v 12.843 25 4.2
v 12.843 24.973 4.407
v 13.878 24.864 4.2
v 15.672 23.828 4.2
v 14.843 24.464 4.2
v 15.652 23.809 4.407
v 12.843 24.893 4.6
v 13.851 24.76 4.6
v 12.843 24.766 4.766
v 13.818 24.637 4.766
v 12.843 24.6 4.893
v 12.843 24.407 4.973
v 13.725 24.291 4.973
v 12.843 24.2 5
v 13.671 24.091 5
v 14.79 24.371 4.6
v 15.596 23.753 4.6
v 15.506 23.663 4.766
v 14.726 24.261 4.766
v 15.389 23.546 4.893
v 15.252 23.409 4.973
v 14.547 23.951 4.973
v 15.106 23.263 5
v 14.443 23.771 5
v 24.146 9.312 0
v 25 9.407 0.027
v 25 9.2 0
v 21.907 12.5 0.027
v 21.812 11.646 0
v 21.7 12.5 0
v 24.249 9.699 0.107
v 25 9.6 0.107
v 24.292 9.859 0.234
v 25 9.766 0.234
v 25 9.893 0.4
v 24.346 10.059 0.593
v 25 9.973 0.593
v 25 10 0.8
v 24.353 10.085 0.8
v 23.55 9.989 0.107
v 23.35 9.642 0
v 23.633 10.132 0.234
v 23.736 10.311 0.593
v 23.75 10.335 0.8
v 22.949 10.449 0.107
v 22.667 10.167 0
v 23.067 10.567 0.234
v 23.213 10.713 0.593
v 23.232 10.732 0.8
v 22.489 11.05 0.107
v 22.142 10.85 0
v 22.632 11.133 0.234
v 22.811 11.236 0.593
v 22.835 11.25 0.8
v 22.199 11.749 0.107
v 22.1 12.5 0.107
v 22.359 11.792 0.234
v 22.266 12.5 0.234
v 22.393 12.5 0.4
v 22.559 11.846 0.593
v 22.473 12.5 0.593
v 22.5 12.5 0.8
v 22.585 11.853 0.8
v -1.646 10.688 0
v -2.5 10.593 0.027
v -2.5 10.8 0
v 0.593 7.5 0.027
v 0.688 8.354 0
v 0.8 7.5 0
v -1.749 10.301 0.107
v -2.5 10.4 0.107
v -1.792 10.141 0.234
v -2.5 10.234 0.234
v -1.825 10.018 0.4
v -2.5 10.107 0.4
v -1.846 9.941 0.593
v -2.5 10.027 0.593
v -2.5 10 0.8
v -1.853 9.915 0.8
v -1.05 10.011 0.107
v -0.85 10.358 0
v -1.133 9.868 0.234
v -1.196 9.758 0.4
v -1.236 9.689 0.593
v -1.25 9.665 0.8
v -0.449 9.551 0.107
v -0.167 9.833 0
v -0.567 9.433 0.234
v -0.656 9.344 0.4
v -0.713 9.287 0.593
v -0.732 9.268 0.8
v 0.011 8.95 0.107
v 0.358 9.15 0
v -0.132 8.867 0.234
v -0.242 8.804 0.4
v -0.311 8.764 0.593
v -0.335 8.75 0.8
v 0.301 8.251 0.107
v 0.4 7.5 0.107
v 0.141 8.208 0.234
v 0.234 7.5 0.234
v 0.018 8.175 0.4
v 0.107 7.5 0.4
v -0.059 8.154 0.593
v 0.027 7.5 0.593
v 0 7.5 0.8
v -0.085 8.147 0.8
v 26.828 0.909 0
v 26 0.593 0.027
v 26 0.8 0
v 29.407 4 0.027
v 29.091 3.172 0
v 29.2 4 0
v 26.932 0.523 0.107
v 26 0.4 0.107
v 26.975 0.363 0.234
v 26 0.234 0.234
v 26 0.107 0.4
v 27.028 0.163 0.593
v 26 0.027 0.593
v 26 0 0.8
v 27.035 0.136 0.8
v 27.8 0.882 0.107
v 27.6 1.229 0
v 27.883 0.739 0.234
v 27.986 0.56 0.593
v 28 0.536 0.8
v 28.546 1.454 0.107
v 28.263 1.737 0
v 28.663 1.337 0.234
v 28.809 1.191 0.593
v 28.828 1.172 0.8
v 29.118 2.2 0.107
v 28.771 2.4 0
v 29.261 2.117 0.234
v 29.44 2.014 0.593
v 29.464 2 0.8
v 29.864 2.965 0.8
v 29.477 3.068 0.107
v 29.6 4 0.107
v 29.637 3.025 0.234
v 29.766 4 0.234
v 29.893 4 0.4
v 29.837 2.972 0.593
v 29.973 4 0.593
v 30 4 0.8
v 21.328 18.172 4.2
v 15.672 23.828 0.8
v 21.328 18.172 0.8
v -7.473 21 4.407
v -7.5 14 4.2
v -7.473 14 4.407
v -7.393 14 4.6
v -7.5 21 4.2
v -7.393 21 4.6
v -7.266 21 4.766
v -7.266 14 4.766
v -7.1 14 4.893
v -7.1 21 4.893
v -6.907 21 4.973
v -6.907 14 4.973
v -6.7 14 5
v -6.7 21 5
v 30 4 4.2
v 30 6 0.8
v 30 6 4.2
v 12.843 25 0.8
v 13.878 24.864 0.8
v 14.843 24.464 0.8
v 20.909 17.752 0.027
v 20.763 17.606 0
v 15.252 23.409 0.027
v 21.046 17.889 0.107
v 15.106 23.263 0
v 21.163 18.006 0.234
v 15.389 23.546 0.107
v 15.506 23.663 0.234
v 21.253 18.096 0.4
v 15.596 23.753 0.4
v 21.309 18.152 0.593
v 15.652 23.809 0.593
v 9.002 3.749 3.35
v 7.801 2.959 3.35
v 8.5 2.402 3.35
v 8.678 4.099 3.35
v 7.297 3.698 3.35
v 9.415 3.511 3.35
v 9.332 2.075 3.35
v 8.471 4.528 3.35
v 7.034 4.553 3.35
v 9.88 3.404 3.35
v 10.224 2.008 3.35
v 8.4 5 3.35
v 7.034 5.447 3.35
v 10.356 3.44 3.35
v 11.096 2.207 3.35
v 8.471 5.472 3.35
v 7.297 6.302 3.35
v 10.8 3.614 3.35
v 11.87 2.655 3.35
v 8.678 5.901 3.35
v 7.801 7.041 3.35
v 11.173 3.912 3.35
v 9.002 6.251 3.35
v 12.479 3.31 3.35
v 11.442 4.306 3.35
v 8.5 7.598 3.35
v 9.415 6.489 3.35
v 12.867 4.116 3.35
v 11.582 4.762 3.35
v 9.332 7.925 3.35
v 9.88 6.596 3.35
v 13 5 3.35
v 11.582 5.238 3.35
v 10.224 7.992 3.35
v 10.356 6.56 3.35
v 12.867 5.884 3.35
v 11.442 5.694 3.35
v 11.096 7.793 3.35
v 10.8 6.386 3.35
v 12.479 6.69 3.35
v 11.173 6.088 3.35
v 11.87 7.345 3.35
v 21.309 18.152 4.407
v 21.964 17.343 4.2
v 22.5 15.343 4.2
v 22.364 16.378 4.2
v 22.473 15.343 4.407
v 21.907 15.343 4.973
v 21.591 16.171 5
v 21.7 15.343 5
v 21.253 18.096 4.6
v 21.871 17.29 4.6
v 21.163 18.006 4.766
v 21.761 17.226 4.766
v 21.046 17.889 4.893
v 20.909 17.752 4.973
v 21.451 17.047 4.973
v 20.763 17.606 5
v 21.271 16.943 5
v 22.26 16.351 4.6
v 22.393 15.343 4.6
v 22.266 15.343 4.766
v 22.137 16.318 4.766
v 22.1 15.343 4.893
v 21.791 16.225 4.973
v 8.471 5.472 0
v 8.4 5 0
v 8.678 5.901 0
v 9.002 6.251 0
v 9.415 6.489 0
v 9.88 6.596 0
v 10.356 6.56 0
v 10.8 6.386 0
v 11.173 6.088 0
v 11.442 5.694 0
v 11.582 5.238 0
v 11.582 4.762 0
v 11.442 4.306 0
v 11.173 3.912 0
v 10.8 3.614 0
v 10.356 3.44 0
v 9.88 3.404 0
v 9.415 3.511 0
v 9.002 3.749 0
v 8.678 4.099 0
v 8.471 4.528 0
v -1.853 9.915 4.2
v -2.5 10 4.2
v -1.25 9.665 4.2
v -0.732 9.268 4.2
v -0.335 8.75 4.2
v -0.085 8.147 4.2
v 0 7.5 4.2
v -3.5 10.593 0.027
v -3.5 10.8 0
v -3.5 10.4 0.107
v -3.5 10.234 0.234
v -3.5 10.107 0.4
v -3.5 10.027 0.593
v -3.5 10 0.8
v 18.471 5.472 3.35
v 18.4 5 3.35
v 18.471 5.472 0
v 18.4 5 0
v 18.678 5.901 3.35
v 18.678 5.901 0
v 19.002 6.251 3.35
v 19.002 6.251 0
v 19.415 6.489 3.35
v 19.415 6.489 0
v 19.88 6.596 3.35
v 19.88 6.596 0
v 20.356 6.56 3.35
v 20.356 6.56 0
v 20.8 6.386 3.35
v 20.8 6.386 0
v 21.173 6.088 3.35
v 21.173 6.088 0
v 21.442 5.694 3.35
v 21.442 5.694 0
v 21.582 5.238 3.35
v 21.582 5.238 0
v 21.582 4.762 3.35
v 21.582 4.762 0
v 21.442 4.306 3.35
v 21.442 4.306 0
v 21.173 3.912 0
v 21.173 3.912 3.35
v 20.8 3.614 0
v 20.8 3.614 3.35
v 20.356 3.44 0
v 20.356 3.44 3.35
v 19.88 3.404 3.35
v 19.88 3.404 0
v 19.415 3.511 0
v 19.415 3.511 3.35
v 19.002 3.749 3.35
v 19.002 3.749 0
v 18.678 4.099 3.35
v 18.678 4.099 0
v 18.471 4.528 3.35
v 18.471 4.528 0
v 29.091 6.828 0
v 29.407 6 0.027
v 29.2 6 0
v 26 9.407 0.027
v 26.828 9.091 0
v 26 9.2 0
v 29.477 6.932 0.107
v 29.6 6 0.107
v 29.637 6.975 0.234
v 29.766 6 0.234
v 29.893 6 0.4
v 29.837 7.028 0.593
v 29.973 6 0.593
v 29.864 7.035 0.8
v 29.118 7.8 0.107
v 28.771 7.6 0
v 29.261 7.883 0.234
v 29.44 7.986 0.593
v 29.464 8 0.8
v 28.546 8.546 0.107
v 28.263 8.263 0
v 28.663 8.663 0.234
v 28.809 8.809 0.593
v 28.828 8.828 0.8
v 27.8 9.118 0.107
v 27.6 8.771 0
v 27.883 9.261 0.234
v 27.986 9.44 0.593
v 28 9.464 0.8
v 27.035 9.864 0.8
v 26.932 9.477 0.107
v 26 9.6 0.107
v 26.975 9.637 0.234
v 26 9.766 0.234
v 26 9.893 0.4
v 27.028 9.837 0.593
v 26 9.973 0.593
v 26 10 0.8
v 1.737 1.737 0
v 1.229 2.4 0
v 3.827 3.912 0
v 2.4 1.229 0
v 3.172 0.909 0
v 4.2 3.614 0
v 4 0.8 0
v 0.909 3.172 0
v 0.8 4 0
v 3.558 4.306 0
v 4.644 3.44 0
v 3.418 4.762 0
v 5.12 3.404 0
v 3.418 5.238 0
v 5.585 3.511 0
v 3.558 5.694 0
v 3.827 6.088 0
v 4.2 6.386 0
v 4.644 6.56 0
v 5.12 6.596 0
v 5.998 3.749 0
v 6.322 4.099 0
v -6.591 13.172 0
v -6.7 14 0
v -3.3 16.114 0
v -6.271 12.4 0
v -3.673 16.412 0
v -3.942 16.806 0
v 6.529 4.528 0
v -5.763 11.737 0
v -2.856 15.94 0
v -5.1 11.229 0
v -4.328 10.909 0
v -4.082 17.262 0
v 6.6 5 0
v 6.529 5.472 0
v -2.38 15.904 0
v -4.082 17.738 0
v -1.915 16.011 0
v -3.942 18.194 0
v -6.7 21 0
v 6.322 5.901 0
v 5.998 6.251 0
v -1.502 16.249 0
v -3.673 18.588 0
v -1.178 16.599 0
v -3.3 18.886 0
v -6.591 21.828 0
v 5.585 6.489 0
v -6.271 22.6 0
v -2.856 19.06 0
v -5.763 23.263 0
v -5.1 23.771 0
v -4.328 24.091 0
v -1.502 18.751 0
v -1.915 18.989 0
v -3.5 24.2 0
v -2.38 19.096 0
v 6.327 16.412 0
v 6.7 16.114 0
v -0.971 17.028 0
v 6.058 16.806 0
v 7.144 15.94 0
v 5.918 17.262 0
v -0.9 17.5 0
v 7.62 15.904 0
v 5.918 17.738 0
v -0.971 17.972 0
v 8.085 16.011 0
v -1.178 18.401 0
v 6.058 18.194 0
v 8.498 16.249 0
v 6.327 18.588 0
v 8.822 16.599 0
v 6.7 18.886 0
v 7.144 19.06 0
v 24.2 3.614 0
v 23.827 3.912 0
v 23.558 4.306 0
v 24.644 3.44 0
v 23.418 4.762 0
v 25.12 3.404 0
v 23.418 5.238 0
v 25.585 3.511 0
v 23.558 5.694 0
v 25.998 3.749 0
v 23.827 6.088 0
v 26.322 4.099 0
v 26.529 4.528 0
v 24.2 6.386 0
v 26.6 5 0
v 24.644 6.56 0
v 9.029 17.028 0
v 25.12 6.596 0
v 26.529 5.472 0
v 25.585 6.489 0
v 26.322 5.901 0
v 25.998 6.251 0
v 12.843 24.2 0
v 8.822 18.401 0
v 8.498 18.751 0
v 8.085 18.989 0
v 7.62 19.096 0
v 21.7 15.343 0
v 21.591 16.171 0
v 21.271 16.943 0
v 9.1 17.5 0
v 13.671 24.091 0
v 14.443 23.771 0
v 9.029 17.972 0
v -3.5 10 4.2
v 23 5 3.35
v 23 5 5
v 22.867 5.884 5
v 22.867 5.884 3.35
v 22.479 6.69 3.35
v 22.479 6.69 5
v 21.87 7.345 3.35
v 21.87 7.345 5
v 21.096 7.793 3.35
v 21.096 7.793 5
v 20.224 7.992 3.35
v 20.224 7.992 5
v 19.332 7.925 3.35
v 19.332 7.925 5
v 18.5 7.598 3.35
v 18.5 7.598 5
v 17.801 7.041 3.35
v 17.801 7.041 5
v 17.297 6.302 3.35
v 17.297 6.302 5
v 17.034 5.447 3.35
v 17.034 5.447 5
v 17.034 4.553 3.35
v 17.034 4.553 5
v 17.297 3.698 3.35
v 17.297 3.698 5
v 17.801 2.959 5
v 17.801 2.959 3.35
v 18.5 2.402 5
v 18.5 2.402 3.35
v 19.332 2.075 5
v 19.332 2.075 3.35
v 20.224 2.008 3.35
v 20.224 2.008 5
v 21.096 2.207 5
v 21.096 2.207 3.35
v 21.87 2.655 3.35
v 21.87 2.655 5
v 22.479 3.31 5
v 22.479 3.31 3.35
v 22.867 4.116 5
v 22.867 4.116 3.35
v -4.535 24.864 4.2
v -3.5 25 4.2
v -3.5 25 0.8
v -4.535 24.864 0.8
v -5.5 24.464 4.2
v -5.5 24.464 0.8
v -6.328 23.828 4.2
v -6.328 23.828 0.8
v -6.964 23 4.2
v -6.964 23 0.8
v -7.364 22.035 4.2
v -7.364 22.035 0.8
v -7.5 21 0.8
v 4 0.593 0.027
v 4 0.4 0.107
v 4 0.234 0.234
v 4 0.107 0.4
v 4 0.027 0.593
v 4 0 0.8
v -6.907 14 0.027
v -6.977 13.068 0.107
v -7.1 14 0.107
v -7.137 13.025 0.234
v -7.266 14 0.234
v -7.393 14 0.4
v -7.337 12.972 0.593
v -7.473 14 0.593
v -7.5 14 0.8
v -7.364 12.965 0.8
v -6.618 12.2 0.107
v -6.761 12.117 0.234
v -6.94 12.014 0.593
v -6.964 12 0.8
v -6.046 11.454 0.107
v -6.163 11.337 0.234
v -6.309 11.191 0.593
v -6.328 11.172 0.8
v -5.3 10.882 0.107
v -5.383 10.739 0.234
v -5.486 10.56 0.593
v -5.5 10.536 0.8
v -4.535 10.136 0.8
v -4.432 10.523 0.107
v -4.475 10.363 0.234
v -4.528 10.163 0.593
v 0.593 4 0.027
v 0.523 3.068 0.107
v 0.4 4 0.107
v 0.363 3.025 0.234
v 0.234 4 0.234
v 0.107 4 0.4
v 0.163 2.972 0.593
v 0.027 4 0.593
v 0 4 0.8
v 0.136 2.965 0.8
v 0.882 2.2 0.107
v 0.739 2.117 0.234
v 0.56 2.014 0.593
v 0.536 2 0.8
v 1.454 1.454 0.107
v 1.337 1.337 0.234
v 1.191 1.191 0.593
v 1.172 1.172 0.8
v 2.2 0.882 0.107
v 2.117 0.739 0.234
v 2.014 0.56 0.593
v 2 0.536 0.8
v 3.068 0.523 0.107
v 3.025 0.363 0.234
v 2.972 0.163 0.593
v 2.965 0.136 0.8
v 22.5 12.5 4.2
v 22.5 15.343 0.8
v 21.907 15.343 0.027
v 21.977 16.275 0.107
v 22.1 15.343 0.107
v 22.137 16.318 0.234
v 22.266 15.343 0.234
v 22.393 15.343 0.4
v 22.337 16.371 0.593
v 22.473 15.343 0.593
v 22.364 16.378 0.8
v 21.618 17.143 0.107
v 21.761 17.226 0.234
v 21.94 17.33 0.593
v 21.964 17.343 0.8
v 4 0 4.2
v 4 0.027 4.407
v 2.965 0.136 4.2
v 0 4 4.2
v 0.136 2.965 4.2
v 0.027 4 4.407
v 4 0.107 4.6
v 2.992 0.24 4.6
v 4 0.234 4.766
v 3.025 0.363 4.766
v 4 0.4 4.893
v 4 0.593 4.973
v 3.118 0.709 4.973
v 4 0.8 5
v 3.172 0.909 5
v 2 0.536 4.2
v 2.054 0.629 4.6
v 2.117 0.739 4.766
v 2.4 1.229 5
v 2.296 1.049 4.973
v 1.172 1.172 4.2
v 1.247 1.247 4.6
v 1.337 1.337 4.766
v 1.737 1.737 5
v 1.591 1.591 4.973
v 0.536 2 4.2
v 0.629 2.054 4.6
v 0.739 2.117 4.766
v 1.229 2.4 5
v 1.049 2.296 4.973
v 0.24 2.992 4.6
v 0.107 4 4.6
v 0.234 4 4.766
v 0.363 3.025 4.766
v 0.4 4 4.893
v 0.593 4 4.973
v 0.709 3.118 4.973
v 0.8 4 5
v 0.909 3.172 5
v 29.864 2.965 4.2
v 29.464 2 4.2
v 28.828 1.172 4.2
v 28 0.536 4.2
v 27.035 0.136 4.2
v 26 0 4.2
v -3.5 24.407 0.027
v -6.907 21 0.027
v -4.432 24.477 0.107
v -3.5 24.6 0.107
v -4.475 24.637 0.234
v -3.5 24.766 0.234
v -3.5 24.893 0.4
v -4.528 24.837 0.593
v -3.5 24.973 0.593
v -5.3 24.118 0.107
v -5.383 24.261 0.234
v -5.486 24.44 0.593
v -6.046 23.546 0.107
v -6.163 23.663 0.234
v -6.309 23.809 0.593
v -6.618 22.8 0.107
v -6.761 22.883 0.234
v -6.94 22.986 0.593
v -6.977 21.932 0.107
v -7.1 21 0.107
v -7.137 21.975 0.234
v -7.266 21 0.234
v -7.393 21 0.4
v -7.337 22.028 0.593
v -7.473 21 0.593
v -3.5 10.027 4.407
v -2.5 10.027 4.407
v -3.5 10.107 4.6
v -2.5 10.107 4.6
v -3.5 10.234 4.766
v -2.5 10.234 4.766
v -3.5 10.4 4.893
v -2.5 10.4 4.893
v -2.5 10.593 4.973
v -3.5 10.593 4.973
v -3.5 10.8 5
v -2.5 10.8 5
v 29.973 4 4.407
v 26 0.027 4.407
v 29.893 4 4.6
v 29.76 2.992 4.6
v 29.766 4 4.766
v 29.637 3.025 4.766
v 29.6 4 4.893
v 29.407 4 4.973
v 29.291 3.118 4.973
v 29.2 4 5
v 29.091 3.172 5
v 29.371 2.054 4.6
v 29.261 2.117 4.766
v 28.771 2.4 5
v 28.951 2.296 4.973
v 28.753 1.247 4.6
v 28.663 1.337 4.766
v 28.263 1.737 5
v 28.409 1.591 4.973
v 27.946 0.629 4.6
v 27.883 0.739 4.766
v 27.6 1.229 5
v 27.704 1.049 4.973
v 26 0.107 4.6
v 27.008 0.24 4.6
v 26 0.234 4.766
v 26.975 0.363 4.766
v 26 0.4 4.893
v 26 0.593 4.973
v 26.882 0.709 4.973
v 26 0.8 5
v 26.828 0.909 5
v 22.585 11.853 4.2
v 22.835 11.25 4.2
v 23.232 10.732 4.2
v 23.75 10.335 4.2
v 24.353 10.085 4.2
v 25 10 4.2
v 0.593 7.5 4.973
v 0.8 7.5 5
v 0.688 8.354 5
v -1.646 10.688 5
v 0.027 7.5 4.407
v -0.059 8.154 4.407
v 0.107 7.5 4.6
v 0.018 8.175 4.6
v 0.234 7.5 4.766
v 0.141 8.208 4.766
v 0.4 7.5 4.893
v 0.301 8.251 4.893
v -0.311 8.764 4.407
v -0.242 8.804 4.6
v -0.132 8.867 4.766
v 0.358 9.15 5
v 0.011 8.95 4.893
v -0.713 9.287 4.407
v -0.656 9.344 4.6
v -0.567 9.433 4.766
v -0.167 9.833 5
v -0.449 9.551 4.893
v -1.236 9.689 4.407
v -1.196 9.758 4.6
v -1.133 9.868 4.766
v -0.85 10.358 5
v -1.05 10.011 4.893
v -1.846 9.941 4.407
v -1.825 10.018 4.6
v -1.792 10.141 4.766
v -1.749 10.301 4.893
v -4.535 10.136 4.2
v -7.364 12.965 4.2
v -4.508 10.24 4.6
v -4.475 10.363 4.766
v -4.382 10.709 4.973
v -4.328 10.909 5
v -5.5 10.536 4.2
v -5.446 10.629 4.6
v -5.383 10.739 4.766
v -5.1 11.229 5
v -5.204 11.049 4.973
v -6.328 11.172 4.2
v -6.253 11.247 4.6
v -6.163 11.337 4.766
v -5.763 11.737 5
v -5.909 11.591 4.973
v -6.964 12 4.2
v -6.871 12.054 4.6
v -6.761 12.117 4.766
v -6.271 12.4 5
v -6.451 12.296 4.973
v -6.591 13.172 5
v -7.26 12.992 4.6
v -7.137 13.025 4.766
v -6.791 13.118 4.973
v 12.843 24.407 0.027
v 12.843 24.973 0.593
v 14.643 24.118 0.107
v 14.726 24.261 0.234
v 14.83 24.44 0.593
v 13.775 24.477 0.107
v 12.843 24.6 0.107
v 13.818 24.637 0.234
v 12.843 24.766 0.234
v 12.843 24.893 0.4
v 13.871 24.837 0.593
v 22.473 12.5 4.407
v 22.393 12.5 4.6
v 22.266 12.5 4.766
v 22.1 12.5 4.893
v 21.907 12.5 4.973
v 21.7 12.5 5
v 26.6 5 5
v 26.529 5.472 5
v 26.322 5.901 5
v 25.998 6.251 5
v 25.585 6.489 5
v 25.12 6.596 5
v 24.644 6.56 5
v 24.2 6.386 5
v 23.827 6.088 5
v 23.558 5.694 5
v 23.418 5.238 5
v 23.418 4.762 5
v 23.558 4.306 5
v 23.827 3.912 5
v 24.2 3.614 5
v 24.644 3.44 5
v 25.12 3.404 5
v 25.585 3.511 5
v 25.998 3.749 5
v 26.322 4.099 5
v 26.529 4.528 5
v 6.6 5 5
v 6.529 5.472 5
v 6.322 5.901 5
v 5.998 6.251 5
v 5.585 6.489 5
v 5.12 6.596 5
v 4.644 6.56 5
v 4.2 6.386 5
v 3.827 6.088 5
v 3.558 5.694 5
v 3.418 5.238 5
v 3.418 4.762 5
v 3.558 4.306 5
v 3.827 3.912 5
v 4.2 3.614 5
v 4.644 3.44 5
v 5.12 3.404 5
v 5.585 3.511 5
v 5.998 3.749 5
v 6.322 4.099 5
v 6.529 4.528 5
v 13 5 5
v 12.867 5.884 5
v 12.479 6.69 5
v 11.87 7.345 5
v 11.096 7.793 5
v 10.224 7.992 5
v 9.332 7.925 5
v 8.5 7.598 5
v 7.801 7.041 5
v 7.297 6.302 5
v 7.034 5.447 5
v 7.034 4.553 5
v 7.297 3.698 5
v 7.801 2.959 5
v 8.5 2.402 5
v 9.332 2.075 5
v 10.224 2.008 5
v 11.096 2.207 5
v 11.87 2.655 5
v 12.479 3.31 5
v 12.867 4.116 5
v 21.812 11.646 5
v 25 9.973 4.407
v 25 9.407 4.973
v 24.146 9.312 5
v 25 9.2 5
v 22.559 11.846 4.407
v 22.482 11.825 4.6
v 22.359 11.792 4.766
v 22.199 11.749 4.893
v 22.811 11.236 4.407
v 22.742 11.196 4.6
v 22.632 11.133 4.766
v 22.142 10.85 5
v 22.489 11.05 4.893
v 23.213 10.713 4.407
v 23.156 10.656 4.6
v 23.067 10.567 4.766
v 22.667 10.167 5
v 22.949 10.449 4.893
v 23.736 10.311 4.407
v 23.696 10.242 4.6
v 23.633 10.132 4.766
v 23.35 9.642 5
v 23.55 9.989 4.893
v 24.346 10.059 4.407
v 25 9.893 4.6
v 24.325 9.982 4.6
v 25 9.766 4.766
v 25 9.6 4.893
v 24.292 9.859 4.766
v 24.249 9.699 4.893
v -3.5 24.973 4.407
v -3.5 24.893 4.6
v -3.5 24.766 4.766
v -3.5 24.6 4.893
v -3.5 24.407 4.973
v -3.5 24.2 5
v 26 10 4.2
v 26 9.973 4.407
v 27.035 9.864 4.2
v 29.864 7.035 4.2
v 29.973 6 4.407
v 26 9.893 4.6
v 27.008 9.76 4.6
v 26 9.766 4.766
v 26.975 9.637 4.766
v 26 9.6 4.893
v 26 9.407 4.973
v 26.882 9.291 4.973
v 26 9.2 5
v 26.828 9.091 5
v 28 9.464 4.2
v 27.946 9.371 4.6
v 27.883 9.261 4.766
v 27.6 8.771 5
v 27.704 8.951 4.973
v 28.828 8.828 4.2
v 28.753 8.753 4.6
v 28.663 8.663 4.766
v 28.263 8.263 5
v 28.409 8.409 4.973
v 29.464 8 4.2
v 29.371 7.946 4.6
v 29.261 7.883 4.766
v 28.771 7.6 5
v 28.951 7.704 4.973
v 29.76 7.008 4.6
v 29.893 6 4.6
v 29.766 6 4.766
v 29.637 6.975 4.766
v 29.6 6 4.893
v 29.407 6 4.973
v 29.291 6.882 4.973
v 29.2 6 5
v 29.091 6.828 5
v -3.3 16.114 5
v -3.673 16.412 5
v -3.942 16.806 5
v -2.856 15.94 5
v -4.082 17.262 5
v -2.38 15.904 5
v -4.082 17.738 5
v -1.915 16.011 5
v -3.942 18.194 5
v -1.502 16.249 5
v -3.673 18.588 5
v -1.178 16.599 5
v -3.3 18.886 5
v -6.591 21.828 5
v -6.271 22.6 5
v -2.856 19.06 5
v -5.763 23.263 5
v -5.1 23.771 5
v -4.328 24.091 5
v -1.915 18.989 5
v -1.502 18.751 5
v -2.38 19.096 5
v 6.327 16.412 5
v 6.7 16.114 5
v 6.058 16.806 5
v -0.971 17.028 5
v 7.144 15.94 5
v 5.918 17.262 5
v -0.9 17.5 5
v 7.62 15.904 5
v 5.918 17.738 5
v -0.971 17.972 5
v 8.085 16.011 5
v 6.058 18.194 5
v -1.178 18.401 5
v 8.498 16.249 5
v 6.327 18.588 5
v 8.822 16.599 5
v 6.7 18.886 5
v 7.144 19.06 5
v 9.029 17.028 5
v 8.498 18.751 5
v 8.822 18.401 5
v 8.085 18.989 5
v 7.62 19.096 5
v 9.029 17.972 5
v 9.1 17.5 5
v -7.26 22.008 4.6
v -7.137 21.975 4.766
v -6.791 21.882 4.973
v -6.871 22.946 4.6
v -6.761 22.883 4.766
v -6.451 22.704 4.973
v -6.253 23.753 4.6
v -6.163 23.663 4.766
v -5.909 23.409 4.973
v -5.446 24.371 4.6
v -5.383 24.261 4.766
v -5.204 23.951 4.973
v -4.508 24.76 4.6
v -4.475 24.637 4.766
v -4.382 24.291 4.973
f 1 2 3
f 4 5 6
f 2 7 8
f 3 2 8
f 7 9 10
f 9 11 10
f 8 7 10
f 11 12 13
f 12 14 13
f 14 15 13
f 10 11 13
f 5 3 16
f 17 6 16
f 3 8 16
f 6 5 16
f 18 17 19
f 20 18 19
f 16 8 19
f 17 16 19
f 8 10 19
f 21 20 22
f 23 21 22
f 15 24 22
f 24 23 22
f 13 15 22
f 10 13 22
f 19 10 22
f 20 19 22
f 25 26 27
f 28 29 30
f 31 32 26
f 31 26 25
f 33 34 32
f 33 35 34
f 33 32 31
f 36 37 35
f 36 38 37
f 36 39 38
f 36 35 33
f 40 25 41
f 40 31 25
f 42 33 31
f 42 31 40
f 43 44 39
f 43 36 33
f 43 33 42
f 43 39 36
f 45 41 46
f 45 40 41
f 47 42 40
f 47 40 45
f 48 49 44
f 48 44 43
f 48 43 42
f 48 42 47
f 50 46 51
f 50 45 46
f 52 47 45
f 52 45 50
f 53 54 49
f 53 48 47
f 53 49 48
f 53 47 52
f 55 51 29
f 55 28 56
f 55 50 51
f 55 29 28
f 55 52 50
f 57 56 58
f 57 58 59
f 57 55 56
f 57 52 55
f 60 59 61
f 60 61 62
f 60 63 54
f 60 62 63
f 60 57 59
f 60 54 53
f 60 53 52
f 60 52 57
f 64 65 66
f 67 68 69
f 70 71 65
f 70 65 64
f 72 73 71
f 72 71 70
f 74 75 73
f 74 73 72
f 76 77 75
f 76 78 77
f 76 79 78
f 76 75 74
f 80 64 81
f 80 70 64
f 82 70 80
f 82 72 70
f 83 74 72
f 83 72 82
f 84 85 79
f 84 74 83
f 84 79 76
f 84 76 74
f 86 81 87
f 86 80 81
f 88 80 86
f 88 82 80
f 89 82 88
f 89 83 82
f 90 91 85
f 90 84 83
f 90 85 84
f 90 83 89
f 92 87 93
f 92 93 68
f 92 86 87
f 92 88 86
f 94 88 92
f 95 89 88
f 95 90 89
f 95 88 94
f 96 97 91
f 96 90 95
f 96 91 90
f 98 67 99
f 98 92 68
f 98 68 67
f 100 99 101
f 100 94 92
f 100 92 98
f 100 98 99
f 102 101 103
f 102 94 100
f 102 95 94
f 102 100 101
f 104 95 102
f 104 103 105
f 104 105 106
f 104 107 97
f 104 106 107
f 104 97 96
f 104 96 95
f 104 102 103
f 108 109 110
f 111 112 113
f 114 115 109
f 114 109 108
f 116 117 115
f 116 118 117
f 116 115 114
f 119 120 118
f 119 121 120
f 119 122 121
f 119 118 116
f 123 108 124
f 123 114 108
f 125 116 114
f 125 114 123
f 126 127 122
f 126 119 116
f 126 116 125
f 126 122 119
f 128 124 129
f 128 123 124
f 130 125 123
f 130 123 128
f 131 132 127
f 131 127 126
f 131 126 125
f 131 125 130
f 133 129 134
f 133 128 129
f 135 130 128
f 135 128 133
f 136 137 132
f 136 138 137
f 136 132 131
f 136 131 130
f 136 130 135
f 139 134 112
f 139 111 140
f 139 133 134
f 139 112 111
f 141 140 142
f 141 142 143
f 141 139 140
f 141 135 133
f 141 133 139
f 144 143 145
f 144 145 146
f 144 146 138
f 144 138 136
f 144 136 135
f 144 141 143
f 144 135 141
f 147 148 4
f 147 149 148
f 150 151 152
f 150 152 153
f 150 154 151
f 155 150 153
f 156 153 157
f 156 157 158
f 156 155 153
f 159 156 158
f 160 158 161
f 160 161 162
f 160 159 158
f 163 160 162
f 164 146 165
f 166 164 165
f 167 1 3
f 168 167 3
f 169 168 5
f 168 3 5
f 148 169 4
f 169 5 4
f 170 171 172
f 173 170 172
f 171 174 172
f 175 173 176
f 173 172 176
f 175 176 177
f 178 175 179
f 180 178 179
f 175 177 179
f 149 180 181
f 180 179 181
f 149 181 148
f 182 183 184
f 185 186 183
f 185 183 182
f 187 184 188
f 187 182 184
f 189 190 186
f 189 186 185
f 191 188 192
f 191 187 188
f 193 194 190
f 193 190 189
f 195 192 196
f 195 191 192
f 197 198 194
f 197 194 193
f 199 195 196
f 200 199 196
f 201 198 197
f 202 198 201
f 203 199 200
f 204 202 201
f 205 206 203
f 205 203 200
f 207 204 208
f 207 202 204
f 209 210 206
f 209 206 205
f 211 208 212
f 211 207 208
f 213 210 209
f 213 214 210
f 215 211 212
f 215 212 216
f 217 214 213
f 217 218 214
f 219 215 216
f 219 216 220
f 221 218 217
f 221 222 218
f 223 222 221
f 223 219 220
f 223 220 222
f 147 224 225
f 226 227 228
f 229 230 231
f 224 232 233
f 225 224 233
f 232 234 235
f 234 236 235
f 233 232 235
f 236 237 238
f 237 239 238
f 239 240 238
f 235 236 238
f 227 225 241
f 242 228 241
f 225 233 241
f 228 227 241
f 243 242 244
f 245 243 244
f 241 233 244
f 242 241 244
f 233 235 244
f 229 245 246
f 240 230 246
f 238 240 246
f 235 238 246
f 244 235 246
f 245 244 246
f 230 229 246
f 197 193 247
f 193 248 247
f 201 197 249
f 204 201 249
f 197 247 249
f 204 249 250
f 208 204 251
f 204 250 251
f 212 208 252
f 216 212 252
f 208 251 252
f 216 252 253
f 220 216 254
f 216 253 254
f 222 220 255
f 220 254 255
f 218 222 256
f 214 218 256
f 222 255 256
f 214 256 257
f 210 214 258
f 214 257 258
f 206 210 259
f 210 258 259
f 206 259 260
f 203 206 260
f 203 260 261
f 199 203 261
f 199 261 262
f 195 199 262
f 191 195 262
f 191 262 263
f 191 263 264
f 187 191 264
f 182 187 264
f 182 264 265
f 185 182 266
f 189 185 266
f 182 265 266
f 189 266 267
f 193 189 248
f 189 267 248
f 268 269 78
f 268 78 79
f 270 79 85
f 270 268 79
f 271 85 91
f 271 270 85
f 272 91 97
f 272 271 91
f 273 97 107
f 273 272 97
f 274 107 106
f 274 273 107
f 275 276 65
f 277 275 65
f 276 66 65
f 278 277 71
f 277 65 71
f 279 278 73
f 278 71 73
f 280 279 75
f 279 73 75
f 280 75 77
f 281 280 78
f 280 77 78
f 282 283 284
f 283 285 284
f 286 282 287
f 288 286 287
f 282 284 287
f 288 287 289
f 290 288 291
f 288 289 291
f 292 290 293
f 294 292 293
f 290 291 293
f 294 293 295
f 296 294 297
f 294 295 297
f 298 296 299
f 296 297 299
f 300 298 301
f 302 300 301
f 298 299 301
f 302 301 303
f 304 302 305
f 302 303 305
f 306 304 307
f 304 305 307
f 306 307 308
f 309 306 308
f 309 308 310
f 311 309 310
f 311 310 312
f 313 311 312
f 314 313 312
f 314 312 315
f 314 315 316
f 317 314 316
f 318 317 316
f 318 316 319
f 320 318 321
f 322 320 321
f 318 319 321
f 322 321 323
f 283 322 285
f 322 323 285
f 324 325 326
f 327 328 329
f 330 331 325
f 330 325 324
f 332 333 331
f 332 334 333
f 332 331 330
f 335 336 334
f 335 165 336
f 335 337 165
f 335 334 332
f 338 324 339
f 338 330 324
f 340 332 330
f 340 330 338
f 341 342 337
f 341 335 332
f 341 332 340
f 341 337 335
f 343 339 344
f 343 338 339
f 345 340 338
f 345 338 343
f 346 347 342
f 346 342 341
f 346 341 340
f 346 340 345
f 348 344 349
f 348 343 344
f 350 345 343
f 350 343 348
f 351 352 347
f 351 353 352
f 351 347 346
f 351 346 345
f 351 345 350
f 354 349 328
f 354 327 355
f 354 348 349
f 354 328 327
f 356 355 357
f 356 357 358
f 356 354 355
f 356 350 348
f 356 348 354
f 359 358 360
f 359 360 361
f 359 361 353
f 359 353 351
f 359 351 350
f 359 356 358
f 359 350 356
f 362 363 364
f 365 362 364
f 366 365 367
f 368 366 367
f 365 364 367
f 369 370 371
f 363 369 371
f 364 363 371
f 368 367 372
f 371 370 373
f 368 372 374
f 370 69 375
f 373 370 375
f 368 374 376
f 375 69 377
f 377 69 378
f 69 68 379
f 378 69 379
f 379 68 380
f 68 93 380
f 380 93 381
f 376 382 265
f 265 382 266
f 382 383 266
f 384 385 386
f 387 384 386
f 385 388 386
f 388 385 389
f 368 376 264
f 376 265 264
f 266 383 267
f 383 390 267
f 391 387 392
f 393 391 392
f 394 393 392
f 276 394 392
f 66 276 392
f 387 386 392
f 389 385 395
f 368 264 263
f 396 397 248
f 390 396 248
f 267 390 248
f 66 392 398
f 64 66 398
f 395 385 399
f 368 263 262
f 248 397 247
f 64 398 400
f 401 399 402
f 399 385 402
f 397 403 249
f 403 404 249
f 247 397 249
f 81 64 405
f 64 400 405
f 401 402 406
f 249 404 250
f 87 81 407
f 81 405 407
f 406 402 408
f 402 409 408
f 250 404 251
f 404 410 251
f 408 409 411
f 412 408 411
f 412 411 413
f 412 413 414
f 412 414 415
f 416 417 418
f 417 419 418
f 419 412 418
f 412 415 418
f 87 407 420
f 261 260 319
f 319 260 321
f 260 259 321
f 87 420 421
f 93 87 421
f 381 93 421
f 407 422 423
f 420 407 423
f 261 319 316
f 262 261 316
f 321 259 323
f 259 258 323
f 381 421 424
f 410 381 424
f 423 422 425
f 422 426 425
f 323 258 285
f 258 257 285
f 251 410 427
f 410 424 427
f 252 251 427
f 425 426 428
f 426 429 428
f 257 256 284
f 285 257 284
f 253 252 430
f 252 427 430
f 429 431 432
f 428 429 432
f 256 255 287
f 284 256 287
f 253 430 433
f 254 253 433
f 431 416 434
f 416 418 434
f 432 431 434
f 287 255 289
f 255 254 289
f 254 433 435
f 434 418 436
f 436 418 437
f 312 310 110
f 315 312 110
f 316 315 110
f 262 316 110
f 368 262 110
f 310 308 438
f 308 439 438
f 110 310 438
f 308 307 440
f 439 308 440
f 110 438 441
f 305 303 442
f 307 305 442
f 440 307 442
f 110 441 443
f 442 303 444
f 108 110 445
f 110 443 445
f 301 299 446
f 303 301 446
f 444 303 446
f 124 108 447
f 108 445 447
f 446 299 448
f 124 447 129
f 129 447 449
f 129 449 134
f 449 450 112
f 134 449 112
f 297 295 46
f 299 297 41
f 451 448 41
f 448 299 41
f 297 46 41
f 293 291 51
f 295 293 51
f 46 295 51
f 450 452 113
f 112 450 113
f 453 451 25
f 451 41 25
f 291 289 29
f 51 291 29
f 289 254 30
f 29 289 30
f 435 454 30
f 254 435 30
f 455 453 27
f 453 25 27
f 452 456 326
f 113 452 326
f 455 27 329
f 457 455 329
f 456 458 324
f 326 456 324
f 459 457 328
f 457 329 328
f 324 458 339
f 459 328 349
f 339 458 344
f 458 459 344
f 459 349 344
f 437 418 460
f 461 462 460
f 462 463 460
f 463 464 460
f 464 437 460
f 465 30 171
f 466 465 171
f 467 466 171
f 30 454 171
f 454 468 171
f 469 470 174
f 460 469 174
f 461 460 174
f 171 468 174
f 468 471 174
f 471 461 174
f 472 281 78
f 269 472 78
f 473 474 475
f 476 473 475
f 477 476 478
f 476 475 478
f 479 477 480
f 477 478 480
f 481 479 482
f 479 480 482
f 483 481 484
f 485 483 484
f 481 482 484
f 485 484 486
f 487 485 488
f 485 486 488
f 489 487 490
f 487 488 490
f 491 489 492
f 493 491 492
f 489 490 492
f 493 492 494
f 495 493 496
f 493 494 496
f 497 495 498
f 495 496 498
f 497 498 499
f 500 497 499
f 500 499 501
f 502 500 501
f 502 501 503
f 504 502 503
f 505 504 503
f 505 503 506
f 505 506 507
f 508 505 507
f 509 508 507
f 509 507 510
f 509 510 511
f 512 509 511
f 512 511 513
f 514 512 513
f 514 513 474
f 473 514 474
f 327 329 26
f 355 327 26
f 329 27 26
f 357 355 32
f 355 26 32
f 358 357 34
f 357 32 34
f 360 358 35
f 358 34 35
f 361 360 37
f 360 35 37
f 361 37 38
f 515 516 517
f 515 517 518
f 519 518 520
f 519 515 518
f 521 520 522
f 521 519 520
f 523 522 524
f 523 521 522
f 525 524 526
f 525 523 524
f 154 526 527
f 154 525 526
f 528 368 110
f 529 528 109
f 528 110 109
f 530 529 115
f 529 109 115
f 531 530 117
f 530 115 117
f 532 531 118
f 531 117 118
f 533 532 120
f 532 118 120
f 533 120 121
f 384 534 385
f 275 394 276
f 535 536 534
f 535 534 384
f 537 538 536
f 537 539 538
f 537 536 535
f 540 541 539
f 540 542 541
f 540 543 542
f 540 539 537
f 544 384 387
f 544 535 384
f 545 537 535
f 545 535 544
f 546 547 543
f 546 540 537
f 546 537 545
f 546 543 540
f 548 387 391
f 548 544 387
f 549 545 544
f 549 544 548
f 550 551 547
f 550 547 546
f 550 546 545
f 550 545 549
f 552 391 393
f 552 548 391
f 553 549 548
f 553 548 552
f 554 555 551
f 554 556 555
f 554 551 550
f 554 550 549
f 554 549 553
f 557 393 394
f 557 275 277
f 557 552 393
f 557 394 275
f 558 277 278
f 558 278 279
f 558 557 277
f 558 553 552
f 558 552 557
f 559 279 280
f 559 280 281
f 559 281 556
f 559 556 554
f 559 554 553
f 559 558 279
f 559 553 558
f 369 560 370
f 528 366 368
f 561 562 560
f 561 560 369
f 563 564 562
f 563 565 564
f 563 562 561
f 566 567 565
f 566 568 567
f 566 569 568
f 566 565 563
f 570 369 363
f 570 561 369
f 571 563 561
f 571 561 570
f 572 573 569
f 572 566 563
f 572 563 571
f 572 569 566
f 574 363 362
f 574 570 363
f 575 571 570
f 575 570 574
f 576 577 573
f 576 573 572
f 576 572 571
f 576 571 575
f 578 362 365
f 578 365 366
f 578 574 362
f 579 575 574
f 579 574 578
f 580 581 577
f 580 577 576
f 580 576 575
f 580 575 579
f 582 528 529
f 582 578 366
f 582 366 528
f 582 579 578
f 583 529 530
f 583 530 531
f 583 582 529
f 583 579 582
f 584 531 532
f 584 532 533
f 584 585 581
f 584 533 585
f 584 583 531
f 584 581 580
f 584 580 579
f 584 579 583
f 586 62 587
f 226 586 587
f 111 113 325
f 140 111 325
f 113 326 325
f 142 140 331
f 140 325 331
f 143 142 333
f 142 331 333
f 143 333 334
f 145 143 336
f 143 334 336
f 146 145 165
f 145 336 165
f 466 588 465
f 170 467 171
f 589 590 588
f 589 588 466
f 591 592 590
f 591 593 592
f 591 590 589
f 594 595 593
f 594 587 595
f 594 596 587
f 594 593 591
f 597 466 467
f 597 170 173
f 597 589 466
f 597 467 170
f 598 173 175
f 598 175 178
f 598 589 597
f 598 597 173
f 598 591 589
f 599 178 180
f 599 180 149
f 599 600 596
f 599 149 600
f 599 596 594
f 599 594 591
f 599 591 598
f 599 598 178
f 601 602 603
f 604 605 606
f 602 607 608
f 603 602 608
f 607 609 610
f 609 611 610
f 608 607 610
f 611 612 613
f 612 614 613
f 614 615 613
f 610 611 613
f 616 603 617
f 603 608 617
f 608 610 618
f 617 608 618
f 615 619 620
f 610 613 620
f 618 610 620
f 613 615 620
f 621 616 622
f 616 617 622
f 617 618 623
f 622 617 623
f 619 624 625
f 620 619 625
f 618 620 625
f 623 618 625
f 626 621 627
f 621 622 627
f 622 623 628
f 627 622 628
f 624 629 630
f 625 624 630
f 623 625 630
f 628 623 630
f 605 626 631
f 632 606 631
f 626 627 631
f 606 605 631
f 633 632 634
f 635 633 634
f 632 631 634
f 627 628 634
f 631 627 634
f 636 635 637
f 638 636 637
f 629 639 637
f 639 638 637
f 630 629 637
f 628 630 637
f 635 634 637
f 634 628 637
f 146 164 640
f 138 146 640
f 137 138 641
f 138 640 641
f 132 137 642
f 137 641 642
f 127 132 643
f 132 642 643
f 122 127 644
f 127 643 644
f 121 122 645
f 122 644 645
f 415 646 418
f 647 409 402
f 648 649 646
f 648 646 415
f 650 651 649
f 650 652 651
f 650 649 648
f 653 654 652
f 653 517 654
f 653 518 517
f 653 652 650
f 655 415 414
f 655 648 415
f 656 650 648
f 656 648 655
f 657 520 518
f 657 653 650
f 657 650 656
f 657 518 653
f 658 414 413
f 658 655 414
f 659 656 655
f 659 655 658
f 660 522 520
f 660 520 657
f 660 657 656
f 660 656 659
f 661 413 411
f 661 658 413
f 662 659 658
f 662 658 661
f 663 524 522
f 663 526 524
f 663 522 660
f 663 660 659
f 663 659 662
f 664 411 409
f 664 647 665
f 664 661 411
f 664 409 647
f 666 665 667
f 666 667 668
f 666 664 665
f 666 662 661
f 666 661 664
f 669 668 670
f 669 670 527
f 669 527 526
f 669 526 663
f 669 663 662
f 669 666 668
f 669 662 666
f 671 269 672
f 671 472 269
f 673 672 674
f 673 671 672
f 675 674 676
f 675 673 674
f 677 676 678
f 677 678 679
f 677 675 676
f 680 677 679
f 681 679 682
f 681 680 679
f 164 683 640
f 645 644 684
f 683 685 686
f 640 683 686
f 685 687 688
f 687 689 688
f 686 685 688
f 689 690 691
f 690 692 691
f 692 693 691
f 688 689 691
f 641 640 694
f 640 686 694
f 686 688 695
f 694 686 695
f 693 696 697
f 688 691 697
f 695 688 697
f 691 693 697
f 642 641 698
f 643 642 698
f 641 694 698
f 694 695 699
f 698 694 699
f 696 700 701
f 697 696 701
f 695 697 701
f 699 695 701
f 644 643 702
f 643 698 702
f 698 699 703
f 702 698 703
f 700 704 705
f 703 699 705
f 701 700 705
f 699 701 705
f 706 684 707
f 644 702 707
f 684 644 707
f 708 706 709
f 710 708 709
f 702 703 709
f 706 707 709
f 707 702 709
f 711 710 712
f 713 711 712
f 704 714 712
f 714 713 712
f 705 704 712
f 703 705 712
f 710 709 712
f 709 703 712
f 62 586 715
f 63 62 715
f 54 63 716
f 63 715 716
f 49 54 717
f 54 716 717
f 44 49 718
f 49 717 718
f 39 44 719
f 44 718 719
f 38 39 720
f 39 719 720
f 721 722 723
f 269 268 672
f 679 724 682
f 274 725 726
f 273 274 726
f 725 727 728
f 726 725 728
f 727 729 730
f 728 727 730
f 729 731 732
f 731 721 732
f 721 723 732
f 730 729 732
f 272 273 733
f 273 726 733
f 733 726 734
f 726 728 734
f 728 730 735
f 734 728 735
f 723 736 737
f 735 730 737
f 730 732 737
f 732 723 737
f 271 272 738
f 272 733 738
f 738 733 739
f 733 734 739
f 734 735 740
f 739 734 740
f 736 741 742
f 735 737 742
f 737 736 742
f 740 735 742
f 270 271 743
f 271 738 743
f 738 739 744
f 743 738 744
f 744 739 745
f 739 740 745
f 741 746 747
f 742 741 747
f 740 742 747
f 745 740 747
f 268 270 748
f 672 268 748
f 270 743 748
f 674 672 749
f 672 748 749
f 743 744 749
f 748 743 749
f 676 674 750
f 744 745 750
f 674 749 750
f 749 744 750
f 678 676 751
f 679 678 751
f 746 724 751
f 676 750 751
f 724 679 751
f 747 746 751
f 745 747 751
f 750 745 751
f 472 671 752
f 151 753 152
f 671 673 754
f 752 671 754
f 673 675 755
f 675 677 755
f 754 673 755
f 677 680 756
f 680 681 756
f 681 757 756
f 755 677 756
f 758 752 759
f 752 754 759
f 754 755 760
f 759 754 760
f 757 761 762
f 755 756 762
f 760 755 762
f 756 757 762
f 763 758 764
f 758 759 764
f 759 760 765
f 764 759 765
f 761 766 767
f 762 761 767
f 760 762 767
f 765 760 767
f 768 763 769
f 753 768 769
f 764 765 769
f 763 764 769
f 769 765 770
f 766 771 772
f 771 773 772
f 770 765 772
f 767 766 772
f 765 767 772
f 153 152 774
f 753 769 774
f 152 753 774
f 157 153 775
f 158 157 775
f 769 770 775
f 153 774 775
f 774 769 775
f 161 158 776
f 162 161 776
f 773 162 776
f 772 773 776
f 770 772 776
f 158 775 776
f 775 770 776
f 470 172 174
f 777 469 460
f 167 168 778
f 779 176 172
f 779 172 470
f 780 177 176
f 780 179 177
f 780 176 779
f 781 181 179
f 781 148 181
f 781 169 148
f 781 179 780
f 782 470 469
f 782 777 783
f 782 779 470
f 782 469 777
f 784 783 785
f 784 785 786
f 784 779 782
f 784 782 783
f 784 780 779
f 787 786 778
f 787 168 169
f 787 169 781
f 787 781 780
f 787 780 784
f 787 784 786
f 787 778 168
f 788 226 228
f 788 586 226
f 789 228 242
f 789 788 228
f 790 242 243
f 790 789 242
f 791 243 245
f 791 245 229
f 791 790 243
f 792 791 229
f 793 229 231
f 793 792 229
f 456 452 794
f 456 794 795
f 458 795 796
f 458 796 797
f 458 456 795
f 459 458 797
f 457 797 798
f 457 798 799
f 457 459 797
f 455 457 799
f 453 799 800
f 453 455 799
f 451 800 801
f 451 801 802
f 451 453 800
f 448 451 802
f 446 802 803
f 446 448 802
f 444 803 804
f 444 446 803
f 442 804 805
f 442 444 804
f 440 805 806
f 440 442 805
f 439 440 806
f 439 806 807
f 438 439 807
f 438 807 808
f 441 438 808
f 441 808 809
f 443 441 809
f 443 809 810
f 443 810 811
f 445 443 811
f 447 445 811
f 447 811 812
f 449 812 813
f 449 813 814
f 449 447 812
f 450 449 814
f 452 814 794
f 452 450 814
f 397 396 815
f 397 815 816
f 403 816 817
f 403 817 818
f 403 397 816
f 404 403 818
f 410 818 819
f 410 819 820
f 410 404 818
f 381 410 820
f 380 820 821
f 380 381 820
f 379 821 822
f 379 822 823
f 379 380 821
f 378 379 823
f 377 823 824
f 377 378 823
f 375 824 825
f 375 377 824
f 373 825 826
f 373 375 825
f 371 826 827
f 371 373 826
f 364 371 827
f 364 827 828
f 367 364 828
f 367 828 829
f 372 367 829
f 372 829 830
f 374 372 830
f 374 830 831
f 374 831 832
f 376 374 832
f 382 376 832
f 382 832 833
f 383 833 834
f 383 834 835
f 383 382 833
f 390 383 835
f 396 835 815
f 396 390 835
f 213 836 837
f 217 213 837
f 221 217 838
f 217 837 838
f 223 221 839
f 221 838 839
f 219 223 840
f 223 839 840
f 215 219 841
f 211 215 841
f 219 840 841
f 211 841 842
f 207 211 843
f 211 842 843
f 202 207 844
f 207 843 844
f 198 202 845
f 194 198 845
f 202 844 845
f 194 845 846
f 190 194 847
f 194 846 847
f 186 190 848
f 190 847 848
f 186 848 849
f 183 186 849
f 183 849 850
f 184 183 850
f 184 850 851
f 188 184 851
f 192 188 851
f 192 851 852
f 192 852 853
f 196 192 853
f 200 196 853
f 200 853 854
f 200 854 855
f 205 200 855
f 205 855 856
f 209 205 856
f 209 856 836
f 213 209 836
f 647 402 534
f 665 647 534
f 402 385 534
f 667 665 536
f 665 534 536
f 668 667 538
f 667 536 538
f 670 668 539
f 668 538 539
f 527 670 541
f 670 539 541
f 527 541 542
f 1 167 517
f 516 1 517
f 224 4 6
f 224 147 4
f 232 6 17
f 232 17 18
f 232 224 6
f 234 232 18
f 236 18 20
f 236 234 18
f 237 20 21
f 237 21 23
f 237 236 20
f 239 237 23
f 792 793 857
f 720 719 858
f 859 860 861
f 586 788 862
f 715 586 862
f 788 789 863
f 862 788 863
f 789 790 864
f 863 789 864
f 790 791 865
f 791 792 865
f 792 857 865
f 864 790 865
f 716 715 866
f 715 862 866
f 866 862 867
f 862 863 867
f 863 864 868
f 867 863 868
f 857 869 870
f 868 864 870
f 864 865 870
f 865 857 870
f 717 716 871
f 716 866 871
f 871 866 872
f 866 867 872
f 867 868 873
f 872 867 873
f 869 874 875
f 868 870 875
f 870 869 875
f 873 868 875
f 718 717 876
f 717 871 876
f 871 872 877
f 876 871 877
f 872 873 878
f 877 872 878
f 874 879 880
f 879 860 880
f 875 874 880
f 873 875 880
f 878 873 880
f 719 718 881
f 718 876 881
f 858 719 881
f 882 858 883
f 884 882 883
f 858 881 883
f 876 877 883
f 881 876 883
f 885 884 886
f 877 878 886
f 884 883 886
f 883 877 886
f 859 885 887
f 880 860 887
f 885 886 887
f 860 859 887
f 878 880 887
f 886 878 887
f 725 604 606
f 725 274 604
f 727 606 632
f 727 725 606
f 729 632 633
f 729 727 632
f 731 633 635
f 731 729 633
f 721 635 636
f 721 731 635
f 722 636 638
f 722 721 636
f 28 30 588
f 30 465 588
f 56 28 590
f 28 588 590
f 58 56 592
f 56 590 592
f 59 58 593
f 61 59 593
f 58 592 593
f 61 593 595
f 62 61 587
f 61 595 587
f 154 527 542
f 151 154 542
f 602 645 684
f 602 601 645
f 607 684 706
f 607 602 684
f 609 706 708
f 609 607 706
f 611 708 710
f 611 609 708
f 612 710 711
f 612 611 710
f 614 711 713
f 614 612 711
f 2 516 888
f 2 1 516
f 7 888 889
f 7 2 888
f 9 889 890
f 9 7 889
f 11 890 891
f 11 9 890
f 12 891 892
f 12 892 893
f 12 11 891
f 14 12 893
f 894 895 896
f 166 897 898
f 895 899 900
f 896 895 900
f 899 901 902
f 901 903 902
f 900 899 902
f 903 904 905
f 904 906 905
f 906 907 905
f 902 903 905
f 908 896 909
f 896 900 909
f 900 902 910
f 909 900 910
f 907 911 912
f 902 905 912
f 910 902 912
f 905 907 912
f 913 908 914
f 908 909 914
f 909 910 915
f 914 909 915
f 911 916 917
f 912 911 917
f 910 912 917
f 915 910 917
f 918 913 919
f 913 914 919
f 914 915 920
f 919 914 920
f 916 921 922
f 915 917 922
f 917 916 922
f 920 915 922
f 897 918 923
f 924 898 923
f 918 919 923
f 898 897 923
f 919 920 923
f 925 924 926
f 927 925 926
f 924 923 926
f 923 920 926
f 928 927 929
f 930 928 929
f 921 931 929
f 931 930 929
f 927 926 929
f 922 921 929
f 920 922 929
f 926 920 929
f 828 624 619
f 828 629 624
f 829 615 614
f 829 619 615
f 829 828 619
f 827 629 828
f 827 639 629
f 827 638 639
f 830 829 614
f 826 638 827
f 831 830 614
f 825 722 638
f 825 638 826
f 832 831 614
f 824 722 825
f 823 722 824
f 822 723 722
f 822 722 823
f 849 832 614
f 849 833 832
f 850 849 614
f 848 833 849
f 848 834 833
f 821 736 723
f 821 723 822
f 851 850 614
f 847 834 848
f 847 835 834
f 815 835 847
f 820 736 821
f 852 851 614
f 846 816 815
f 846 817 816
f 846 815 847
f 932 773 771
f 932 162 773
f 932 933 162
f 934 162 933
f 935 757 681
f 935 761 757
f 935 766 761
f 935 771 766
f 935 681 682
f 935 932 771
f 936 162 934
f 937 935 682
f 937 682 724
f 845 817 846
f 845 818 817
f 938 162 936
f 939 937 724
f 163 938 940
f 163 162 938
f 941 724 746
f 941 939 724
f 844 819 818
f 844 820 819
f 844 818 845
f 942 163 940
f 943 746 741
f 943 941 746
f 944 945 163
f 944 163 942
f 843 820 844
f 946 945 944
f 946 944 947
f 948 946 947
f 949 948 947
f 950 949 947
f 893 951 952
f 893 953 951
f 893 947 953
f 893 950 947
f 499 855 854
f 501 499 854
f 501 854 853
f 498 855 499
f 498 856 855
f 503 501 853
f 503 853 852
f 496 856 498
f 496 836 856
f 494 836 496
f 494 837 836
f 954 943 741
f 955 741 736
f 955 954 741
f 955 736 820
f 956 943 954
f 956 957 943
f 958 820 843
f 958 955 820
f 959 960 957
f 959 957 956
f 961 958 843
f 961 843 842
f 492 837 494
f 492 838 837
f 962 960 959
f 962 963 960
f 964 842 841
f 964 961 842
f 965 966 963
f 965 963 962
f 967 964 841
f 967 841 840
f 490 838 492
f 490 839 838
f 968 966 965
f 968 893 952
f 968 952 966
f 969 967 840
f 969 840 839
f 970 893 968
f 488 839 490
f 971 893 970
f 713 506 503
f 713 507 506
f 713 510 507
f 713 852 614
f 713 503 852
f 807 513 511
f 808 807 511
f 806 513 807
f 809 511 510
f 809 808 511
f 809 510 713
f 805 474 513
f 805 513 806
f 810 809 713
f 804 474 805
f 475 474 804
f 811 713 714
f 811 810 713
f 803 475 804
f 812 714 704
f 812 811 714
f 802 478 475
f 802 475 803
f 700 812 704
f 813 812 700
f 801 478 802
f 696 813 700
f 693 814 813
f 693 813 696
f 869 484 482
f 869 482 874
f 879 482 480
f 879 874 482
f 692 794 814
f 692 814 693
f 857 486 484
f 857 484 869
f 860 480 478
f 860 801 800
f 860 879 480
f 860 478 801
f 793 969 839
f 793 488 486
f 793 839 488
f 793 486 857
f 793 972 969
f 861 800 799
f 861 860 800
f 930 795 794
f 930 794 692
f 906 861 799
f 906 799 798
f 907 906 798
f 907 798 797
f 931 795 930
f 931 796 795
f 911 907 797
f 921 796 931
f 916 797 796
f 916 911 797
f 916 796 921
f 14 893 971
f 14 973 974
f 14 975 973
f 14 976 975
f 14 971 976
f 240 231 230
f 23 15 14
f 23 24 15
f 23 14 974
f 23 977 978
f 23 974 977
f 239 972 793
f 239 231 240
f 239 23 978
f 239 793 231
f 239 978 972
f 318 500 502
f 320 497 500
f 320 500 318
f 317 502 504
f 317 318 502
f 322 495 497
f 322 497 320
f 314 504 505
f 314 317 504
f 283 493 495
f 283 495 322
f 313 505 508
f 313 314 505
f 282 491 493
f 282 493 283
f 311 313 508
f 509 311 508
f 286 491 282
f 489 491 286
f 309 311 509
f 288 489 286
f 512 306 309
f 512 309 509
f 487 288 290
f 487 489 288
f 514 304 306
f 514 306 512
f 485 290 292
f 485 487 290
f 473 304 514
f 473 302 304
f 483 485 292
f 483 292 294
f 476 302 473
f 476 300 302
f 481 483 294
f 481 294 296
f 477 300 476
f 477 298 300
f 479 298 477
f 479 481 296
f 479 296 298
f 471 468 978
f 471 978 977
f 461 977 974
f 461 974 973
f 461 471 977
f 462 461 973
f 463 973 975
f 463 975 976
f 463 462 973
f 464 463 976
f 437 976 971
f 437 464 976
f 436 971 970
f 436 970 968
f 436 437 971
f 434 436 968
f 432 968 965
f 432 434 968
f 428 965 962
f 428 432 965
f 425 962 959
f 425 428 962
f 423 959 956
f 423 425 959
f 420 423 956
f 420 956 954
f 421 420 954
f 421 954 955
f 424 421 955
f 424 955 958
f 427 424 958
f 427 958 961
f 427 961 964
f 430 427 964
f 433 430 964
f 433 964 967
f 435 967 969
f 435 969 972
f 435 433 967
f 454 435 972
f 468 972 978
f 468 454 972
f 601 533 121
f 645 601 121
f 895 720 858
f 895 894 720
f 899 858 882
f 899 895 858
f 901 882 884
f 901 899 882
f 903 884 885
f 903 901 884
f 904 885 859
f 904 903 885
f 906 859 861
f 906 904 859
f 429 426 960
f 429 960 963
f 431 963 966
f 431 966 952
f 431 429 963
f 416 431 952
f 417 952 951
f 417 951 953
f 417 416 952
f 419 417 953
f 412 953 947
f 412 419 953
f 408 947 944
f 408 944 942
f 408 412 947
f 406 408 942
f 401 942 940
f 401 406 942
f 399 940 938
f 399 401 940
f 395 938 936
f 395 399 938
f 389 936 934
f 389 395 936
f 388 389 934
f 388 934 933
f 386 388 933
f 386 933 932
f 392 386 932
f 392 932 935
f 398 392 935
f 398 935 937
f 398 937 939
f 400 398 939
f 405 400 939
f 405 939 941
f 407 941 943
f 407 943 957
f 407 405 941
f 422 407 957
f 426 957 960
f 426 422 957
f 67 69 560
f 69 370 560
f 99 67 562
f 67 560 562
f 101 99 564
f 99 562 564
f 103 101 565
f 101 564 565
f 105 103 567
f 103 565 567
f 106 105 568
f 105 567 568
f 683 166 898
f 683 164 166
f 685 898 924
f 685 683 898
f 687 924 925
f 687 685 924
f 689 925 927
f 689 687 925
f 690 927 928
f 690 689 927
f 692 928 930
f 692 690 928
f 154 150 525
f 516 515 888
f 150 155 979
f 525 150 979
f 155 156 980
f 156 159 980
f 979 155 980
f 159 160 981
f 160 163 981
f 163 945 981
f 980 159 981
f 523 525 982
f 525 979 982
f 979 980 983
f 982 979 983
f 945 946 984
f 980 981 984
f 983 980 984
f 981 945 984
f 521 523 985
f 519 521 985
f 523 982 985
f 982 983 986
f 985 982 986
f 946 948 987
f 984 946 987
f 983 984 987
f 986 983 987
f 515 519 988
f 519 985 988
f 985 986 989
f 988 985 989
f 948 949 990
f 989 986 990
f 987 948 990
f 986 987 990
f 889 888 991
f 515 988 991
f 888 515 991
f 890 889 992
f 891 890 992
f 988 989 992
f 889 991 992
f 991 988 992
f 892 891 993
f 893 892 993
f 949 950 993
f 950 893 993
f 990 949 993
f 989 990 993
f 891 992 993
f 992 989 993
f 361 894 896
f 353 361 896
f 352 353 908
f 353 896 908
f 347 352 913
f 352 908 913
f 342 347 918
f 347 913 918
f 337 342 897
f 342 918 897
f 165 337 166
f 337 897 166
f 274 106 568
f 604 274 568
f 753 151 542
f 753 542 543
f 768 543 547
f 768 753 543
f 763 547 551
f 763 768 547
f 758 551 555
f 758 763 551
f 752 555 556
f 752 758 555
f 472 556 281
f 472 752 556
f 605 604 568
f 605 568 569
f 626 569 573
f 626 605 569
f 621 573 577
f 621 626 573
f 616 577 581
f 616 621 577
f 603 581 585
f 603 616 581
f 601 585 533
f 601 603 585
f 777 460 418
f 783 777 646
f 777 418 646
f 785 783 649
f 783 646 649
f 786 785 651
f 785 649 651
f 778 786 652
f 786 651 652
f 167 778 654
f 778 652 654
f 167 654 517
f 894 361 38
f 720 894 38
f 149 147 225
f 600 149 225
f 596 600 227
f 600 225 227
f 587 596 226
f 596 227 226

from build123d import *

# Parameters (mm, degrees)
SKETCH2_W                       = 15
SKETCH2_H                       = 15
BOSS_EXTRUDE1_DEPTH             = 5
M3_CLEARANCE_HOLE1_OUTLINE_R    = 1.6
M3_CLEARANCE_HOLE1_DEPTH        = 5
CBORE_FOR_M3_SBHCS1_D           = 3.2
CBORE_FOR_M3_SBHCS1_CBORE_D     = 6
CBORE_FOR_M3_SBHCS1_CBORE_DEPTH = 1.65
CHAMFER1_SIZE                   = 8
FILLET1_R                       = 4
FILLET2_R                       = 2.5
FILLET3_R                       = 0.8


# Read off the part's stored shape, not the designer's step: M3 Clearance Hole1
with BuildPart() as part:
    # Sketch2 → Boss-Extrude1 (new body)
    with BuildSketch(Plane.XY):
        Polygon((0, 10), (0, 0), (30, 0), (30, 10), (22.5, 10), (7.5, 10), align=None)
        Polygon((-7.5, 10), (0, 10), (7.5, 10), (7.5, 25), (-7.5, 25), align=None)
        with Locations((15, 17.5)):
            Rectangle(SKETCH2_W, SKETCH2_H)
    extrude(amount=BOSS_EXTRUDE1_DEPTH)

    # M3 Clearance Hole1 outline → M3 Clearance Hole1 (cut)
    with BuildSketch(Plane.XY):
        with Locations((7.5, 17.5)):
            Circle(M3_CLEARANCE_HOLE1_OUTLINE_R)
        with Locations((-2.5, 17.5)):
            Circle(M3_CLEARANCE_HOLE1_OUTLINE_R)
        with Locations((25, 5)):
            Circle(M3_CLEARANCE_HOLE1_OUTLINE_R)
        with Locations((5, 5)):
            Circle(M3_CLEARANCE_HOLE1_OUTLINE_R)
    extrude(amount=M3_CLEARANCE_HOLE1_DEPTH, mode=Mode.SUBTRACT)

    # CBORE for M3 SBHCS1 (through all)
    with Locations(Plane.XY.offset(5)):
        with Locations((20, 5), (10, 5)):
            CounterBoreHole(CBORE_FOR_M3_SBHCS1_D / 2, CBORE_FOR_M3_SBHCS1_CBORE_D / 2, CBORE_FOR_M3_SBHCS1_CBORE_DEPTH)

    # Chamfer1
    chamfer1_edges = [part.edges().sort_by_distance(p)[0] for p in [
        (22.5, 25, 2.5),
    ]]
    chamfer(chamfer1_edges, length=CHAMFER1_SIZE)

    # Fillet1
    fillet1_edges = [part.edges().sort_by_distance(p)[0] for p in [
        (-7.5, 10, 2.5),
        (-7.5, 25, 2.5),
        (30, 10, 2.5),
        (30, 0, 2.5),
        (0, 0, 2.5),
        (14.5, 25, 2.5),
        (22.5, 17, 2.5),
    ]]
    fillet(fillet1_edges, radius=FILLET1_R)

    # Fillet2
    fillet2_edges = [part.edges().sort_by_distance(p)[0] for p in [
        (22.5, 10, 2.5),
        (0, 10, 2.5),
    ]]
    fillet(fillet2_edges, radius=FILLET2_R)

    # Fillet3
    fillet3_edges = [part.edges().sort_by_distance(p)[0] for p in [
        (14.37387948, 24.69551813, 5),
        (22.5, 13.921572875, 0),
        (22.5, 13.921572875, 5),
        (25.5, 10, 5),
        (25.5, 10, 0),
        (-3, 10, 5),
        (-3, 10, 0),
        (23.232233047, 10.732233047, 0),
        (23.232233047, 10.732233047, 5),
        (-0.732233047, 9.267766953, 0),
        (-0.732233047, 9.267766953, 5),
        (4.671572875, 25, 5),
        (4.671572875, 25, 0),
        (18.5, 21, 0),
        (30, 5, 0),
        (15, 0, 0),
        (0, 5.75, 0),
        (-7.5, 17.5, 0),
        (1.171572875, 1.171572875, 0),
        (28.828427125, 1.171572875, 0),
        (28.828427125, 8.828427125, 0),
        (-6.328427125, 11.171572875, 0),
        (-6.328427125, 23.828427125, 0),
        (22.19551813, 16.87387948, 0),
        (14.37387948, 24.69551813, 0),
        (18.5, 21, 5),
        (-7.5, 17.5, 5),
        (0, 5.75, 5),
        (15, 0, 5),
        (30, 5, 5),
        (1.171572875, 1.171572875, 5),
        (28.828427125, 1.171572875, 5),
        (28.828427125, 8.828427125, 5),
        (-6.328427125, 11.171572875, 5),
        (-6.328427125, 23.828427125, 5),
        (22.19551813, 16.87387948, 5),
    ]]
    fillet(fillet3_edges, radius=FILLET3_R)


solid = part.part
